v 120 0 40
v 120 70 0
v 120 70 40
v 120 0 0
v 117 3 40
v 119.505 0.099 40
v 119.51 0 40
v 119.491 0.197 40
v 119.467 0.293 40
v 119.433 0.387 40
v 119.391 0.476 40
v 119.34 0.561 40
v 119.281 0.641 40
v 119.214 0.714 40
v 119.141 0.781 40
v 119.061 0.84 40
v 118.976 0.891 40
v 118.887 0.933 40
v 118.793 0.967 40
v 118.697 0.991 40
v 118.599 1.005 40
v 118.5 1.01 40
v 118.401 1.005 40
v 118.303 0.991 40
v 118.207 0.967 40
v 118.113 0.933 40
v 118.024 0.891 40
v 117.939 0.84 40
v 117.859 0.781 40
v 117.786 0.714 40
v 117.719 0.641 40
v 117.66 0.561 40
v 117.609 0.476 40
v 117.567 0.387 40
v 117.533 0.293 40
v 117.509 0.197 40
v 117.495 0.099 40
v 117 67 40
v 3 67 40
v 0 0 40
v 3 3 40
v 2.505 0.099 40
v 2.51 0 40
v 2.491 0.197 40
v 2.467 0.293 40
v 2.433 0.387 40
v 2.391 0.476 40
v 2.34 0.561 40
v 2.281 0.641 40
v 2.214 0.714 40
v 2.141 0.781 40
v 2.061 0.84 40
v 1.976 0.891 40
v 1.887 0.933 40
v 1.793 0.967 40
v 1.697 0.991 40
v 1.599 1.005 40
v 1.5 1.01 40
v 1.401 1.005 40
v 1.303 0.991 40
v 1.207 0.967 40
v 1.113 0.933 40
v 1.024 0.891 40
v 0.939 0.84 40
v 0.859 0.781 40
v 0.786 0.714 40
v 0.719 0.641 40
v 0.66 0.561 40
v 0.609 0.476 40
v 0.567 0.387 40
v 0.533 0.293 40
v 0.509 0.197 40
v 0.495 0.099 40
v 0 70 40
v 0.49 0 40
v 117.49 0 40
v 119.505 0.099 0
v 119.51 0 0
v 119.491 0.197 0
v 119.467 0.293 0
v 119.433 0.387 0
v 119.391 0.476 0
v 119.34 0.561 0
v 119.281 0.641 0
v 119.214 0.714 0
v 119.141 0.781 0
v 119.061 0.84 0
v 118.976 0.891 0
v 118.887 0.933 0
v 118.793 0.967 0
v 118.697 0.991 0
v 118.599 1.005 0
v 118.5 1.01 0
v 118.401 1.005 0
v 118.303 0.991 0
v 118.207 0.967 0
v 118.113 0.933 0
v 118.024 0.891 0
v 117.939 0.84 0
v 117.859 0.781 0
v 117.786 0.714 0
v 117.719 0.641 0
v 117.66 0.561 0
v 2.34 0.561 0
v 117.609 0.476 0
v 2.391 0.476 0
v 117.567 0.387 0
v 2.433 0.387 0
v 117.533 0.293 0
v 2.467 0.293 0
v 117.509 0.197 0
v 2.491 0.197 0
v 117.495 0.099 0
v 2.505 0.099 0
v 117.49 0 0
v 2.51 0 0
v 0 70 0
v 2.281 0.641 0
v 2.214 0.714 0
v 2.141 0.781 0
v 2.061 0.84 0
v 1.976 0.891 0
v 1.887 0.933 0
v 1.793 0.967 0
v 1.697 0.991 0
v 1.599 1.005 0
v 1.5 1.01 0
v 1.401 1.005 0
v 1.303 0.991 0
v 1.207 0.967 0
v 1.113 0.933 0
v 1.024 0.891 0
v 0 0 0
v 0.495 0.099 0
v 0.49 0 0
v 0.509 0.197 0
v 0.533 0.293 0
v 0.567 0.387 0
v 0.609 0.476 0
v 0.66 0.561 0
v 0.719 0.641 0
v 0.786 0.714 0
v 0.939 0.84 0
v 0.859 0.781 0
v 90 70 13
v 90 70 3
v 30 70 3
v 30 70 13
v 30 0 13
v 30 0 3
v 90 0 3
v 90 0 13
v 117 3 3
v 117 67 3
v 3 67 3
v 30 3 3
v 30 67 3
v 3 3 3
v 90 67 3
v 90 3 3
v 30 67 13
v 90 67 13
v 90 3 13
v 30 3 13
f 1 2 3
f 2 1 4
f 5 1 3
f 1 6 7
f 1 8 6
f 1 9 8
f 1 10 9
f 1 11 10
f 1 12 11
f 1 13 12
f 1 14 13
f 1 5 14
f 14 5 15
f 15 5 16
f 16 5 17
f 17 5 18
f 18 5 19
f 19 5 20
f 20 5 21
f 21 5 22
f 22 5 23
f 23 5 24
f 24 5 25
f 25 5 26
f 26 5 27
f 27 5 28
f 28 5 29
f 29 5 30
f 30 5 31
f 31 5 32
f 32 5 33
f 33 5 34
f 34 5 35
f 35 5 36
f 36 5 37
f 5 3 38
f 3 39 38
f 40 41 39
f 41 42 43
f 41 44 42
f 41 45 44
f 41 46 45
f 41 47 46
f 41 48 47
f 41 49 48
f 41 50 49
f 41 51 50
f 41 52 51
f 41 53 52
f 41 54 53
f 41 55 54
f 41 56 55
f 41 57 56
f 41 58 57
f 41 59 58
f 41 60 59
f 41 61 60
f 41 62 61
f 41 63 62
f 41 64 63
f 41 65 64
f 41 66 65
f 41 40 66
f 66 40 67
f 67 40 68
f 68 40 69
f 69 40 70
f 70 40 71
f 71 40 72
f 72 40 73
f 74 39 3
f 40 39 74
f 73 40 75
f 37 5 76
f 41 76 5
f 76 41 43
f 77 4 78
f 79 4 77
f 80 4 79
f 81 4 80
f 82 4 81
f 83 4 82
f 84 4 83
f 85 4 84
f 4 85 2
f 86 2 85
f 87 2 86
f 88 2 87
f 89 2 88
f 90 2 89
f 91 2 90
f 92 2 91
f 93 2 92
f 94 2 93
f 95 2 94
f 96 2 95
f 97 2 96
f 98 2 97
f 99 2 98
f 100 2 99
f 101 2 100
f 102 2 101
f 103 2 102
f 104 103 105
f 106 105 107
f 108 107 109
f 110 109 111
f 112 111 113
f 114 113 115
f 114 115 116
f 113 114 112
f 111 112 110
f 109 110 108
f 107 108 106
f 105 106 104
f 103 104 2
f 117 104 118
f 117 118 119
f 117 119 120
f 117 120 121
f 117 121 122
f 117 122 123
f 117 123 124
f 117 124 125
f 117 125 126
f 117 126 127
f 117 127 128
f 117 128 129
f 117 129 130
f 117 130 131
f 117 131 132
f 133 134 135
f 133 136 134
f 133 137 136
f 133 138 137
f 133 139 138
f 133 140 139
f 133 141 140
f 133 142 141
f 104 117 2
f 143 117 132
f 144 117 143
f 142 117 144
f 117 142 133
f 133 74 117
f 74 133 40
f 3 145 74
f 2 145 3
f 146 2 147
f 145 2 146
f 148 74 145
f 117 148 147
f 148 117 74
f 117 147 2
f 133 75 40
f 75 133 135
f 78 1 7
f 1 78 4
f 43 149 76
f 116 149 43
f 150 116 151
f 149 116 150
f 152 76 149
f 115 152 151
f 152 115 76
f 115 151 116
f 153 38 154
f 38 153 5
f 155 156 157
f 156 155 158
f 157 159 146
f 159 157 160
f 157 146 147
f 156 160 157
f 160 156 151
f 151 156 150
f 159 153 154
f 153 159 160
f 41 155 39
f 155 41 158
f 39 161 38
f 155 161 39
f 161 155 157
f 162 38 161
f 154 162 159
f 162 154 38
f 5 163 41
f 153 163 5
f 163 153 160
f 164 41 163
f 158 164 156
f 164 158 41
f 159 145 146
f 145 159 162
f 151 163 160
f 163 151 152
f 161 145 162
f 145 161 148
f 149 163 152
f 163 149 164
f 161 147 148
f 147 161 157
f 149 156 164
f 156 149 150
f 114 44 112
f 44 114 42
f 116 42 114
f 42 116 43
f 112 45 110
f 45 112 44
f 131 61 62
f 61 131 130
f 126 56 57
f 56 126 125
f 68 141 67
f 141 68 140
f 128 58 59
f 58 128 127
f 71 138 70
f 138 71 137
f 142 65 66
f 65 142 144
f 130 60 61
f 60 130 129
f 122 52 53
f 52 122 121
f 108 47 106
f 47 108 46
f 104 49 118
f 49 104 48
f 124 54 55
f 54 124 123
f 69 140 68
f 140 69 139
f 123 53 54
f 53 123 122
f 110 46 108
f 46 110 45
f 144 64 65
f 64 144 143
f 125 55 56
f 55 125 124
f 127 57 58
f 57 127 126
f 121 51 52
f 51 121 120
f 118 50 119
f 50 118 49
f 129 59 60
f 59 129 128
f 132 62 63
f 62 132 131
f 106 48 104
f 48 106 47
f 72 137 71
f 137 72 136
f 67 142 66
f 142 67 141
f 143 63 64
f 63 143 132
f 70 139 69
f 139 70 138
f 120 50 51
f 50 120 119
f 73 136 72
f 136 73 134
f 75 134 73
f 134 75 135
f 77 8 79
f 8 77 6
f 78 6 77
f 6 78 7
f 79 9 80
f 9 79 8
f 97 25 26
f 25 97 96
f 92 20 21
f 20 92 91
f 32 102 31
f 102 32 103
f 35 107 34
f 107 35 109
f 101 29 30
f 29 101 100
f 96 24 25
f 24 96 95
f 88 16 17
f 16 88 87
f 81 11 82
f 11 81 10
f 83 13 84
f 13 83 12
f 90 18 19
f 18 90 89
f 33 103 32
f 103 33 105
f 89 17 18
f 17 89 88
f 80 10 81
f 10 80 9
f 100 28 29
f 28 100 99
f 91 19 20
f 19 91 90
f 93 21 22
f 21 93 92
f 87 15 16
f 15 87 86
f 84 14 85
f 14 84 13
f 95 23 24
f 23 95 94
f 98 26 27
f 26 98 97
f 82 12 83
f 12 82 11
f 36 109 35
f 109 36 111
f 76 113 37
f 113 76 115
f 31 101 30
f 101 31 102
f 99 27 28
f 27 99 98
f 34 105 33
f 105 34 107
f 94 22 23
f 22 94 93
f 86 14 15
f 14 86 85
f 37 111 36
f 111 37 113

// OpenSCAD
// Buffer tank for mini horizontal gel-electrophoresis box
// Dimensions in mm

// Outer dimensions
outer_x = 120;
outer_y = 70;
outer_z = 40;

// Wall and floor thickness
wall_thickness = 3;
floor_thickness = 3;

// Platform dimensions
platform_length = 60;
platform_height_above_inner_floor = 10;
platform_y_span = "full inner width";

// Electrode hole
hole_diameter = 2;
hole_z = 30;
hole_y = 0;

// Derived dimensions
inner_x = outer_x - 2 * wall_thickness;
inner_y = outer_y - 2 * wall_thickness;
inner_z = outer_z - floor_thickness;

// Platform top Z position
platform_top_z = floor_thickness + platform_height_above_inner_floor;

// Platform half-length
platform_half_x = platform_length / 2;

// Hole radius
hole_radius = hole_diameter / 2;

// Extrusion depth for cutting holes (must extend past faces)
cut_depth = 1.0;

// Build the part
difference() {
    // Main tank body (outer shell)
    cube([outer_x, outer_y, outer_z], center = false);
    
    // Subtract inner cavity (open top)
    // The cavity starts at z = floor_thickness and goes up to outer_z (open top)
    translate([wall_thickness, wall_thickness, floor_thickness]) {
        cube([inner_x, inner_y, outer_z - floor_thickness], center = false);
    }
    
    // Subtract the platform volume from the inner cavity
    // Platform is centered in X, spans full Y, sits on inner floor
    // Platform top is at platform_top_z
    // We need to subtract a block from the inner cavity space
    // The platform occupies:
    // X: from (outer_x/2 - platform_half_x) to (outer_x/2 + platform_half_x)
    // Y: from 0 to outer_y (full span)
    // Z: from floor_thickness to platform_top_z
    
    translate([
        outer_x / 2 - platform_half_x,
        0,
        floor_thickness
    ]) {
        cube([
            platform_length,
            outer_y,
            platform_top_z - floor_thickness
        ], center = false);
    }
    
    // Drill electrode holes through end walls
    // Hole is at y = 0, z = hole_z, along X axis
    // We need to cut through the left and right walls
    // Left wall: x from 0 to wall_thickness
    // Right wall: x from outer_x - wall_thickness to outer_x
    
    // Left hole
    translate([
        wall_thickness / 2,
        hole_y,
        hole_z
    ]) {
        $fn = 64;
        cylinder(
            d = hole_diameter + 0.02,
            h = outer_x + cut_depth,
            center = true
        );
    }
    
    // Right hole
    translate([
                outer_x - wall_thickness / 2,
                hole_y,
                hole_z
            ]) {
                $fn = 64;
                cylinder(
                    d = hole_diameter + 0.02,
                    h = outer_x + cut_depth,
                    center = true
                );
            }
}
